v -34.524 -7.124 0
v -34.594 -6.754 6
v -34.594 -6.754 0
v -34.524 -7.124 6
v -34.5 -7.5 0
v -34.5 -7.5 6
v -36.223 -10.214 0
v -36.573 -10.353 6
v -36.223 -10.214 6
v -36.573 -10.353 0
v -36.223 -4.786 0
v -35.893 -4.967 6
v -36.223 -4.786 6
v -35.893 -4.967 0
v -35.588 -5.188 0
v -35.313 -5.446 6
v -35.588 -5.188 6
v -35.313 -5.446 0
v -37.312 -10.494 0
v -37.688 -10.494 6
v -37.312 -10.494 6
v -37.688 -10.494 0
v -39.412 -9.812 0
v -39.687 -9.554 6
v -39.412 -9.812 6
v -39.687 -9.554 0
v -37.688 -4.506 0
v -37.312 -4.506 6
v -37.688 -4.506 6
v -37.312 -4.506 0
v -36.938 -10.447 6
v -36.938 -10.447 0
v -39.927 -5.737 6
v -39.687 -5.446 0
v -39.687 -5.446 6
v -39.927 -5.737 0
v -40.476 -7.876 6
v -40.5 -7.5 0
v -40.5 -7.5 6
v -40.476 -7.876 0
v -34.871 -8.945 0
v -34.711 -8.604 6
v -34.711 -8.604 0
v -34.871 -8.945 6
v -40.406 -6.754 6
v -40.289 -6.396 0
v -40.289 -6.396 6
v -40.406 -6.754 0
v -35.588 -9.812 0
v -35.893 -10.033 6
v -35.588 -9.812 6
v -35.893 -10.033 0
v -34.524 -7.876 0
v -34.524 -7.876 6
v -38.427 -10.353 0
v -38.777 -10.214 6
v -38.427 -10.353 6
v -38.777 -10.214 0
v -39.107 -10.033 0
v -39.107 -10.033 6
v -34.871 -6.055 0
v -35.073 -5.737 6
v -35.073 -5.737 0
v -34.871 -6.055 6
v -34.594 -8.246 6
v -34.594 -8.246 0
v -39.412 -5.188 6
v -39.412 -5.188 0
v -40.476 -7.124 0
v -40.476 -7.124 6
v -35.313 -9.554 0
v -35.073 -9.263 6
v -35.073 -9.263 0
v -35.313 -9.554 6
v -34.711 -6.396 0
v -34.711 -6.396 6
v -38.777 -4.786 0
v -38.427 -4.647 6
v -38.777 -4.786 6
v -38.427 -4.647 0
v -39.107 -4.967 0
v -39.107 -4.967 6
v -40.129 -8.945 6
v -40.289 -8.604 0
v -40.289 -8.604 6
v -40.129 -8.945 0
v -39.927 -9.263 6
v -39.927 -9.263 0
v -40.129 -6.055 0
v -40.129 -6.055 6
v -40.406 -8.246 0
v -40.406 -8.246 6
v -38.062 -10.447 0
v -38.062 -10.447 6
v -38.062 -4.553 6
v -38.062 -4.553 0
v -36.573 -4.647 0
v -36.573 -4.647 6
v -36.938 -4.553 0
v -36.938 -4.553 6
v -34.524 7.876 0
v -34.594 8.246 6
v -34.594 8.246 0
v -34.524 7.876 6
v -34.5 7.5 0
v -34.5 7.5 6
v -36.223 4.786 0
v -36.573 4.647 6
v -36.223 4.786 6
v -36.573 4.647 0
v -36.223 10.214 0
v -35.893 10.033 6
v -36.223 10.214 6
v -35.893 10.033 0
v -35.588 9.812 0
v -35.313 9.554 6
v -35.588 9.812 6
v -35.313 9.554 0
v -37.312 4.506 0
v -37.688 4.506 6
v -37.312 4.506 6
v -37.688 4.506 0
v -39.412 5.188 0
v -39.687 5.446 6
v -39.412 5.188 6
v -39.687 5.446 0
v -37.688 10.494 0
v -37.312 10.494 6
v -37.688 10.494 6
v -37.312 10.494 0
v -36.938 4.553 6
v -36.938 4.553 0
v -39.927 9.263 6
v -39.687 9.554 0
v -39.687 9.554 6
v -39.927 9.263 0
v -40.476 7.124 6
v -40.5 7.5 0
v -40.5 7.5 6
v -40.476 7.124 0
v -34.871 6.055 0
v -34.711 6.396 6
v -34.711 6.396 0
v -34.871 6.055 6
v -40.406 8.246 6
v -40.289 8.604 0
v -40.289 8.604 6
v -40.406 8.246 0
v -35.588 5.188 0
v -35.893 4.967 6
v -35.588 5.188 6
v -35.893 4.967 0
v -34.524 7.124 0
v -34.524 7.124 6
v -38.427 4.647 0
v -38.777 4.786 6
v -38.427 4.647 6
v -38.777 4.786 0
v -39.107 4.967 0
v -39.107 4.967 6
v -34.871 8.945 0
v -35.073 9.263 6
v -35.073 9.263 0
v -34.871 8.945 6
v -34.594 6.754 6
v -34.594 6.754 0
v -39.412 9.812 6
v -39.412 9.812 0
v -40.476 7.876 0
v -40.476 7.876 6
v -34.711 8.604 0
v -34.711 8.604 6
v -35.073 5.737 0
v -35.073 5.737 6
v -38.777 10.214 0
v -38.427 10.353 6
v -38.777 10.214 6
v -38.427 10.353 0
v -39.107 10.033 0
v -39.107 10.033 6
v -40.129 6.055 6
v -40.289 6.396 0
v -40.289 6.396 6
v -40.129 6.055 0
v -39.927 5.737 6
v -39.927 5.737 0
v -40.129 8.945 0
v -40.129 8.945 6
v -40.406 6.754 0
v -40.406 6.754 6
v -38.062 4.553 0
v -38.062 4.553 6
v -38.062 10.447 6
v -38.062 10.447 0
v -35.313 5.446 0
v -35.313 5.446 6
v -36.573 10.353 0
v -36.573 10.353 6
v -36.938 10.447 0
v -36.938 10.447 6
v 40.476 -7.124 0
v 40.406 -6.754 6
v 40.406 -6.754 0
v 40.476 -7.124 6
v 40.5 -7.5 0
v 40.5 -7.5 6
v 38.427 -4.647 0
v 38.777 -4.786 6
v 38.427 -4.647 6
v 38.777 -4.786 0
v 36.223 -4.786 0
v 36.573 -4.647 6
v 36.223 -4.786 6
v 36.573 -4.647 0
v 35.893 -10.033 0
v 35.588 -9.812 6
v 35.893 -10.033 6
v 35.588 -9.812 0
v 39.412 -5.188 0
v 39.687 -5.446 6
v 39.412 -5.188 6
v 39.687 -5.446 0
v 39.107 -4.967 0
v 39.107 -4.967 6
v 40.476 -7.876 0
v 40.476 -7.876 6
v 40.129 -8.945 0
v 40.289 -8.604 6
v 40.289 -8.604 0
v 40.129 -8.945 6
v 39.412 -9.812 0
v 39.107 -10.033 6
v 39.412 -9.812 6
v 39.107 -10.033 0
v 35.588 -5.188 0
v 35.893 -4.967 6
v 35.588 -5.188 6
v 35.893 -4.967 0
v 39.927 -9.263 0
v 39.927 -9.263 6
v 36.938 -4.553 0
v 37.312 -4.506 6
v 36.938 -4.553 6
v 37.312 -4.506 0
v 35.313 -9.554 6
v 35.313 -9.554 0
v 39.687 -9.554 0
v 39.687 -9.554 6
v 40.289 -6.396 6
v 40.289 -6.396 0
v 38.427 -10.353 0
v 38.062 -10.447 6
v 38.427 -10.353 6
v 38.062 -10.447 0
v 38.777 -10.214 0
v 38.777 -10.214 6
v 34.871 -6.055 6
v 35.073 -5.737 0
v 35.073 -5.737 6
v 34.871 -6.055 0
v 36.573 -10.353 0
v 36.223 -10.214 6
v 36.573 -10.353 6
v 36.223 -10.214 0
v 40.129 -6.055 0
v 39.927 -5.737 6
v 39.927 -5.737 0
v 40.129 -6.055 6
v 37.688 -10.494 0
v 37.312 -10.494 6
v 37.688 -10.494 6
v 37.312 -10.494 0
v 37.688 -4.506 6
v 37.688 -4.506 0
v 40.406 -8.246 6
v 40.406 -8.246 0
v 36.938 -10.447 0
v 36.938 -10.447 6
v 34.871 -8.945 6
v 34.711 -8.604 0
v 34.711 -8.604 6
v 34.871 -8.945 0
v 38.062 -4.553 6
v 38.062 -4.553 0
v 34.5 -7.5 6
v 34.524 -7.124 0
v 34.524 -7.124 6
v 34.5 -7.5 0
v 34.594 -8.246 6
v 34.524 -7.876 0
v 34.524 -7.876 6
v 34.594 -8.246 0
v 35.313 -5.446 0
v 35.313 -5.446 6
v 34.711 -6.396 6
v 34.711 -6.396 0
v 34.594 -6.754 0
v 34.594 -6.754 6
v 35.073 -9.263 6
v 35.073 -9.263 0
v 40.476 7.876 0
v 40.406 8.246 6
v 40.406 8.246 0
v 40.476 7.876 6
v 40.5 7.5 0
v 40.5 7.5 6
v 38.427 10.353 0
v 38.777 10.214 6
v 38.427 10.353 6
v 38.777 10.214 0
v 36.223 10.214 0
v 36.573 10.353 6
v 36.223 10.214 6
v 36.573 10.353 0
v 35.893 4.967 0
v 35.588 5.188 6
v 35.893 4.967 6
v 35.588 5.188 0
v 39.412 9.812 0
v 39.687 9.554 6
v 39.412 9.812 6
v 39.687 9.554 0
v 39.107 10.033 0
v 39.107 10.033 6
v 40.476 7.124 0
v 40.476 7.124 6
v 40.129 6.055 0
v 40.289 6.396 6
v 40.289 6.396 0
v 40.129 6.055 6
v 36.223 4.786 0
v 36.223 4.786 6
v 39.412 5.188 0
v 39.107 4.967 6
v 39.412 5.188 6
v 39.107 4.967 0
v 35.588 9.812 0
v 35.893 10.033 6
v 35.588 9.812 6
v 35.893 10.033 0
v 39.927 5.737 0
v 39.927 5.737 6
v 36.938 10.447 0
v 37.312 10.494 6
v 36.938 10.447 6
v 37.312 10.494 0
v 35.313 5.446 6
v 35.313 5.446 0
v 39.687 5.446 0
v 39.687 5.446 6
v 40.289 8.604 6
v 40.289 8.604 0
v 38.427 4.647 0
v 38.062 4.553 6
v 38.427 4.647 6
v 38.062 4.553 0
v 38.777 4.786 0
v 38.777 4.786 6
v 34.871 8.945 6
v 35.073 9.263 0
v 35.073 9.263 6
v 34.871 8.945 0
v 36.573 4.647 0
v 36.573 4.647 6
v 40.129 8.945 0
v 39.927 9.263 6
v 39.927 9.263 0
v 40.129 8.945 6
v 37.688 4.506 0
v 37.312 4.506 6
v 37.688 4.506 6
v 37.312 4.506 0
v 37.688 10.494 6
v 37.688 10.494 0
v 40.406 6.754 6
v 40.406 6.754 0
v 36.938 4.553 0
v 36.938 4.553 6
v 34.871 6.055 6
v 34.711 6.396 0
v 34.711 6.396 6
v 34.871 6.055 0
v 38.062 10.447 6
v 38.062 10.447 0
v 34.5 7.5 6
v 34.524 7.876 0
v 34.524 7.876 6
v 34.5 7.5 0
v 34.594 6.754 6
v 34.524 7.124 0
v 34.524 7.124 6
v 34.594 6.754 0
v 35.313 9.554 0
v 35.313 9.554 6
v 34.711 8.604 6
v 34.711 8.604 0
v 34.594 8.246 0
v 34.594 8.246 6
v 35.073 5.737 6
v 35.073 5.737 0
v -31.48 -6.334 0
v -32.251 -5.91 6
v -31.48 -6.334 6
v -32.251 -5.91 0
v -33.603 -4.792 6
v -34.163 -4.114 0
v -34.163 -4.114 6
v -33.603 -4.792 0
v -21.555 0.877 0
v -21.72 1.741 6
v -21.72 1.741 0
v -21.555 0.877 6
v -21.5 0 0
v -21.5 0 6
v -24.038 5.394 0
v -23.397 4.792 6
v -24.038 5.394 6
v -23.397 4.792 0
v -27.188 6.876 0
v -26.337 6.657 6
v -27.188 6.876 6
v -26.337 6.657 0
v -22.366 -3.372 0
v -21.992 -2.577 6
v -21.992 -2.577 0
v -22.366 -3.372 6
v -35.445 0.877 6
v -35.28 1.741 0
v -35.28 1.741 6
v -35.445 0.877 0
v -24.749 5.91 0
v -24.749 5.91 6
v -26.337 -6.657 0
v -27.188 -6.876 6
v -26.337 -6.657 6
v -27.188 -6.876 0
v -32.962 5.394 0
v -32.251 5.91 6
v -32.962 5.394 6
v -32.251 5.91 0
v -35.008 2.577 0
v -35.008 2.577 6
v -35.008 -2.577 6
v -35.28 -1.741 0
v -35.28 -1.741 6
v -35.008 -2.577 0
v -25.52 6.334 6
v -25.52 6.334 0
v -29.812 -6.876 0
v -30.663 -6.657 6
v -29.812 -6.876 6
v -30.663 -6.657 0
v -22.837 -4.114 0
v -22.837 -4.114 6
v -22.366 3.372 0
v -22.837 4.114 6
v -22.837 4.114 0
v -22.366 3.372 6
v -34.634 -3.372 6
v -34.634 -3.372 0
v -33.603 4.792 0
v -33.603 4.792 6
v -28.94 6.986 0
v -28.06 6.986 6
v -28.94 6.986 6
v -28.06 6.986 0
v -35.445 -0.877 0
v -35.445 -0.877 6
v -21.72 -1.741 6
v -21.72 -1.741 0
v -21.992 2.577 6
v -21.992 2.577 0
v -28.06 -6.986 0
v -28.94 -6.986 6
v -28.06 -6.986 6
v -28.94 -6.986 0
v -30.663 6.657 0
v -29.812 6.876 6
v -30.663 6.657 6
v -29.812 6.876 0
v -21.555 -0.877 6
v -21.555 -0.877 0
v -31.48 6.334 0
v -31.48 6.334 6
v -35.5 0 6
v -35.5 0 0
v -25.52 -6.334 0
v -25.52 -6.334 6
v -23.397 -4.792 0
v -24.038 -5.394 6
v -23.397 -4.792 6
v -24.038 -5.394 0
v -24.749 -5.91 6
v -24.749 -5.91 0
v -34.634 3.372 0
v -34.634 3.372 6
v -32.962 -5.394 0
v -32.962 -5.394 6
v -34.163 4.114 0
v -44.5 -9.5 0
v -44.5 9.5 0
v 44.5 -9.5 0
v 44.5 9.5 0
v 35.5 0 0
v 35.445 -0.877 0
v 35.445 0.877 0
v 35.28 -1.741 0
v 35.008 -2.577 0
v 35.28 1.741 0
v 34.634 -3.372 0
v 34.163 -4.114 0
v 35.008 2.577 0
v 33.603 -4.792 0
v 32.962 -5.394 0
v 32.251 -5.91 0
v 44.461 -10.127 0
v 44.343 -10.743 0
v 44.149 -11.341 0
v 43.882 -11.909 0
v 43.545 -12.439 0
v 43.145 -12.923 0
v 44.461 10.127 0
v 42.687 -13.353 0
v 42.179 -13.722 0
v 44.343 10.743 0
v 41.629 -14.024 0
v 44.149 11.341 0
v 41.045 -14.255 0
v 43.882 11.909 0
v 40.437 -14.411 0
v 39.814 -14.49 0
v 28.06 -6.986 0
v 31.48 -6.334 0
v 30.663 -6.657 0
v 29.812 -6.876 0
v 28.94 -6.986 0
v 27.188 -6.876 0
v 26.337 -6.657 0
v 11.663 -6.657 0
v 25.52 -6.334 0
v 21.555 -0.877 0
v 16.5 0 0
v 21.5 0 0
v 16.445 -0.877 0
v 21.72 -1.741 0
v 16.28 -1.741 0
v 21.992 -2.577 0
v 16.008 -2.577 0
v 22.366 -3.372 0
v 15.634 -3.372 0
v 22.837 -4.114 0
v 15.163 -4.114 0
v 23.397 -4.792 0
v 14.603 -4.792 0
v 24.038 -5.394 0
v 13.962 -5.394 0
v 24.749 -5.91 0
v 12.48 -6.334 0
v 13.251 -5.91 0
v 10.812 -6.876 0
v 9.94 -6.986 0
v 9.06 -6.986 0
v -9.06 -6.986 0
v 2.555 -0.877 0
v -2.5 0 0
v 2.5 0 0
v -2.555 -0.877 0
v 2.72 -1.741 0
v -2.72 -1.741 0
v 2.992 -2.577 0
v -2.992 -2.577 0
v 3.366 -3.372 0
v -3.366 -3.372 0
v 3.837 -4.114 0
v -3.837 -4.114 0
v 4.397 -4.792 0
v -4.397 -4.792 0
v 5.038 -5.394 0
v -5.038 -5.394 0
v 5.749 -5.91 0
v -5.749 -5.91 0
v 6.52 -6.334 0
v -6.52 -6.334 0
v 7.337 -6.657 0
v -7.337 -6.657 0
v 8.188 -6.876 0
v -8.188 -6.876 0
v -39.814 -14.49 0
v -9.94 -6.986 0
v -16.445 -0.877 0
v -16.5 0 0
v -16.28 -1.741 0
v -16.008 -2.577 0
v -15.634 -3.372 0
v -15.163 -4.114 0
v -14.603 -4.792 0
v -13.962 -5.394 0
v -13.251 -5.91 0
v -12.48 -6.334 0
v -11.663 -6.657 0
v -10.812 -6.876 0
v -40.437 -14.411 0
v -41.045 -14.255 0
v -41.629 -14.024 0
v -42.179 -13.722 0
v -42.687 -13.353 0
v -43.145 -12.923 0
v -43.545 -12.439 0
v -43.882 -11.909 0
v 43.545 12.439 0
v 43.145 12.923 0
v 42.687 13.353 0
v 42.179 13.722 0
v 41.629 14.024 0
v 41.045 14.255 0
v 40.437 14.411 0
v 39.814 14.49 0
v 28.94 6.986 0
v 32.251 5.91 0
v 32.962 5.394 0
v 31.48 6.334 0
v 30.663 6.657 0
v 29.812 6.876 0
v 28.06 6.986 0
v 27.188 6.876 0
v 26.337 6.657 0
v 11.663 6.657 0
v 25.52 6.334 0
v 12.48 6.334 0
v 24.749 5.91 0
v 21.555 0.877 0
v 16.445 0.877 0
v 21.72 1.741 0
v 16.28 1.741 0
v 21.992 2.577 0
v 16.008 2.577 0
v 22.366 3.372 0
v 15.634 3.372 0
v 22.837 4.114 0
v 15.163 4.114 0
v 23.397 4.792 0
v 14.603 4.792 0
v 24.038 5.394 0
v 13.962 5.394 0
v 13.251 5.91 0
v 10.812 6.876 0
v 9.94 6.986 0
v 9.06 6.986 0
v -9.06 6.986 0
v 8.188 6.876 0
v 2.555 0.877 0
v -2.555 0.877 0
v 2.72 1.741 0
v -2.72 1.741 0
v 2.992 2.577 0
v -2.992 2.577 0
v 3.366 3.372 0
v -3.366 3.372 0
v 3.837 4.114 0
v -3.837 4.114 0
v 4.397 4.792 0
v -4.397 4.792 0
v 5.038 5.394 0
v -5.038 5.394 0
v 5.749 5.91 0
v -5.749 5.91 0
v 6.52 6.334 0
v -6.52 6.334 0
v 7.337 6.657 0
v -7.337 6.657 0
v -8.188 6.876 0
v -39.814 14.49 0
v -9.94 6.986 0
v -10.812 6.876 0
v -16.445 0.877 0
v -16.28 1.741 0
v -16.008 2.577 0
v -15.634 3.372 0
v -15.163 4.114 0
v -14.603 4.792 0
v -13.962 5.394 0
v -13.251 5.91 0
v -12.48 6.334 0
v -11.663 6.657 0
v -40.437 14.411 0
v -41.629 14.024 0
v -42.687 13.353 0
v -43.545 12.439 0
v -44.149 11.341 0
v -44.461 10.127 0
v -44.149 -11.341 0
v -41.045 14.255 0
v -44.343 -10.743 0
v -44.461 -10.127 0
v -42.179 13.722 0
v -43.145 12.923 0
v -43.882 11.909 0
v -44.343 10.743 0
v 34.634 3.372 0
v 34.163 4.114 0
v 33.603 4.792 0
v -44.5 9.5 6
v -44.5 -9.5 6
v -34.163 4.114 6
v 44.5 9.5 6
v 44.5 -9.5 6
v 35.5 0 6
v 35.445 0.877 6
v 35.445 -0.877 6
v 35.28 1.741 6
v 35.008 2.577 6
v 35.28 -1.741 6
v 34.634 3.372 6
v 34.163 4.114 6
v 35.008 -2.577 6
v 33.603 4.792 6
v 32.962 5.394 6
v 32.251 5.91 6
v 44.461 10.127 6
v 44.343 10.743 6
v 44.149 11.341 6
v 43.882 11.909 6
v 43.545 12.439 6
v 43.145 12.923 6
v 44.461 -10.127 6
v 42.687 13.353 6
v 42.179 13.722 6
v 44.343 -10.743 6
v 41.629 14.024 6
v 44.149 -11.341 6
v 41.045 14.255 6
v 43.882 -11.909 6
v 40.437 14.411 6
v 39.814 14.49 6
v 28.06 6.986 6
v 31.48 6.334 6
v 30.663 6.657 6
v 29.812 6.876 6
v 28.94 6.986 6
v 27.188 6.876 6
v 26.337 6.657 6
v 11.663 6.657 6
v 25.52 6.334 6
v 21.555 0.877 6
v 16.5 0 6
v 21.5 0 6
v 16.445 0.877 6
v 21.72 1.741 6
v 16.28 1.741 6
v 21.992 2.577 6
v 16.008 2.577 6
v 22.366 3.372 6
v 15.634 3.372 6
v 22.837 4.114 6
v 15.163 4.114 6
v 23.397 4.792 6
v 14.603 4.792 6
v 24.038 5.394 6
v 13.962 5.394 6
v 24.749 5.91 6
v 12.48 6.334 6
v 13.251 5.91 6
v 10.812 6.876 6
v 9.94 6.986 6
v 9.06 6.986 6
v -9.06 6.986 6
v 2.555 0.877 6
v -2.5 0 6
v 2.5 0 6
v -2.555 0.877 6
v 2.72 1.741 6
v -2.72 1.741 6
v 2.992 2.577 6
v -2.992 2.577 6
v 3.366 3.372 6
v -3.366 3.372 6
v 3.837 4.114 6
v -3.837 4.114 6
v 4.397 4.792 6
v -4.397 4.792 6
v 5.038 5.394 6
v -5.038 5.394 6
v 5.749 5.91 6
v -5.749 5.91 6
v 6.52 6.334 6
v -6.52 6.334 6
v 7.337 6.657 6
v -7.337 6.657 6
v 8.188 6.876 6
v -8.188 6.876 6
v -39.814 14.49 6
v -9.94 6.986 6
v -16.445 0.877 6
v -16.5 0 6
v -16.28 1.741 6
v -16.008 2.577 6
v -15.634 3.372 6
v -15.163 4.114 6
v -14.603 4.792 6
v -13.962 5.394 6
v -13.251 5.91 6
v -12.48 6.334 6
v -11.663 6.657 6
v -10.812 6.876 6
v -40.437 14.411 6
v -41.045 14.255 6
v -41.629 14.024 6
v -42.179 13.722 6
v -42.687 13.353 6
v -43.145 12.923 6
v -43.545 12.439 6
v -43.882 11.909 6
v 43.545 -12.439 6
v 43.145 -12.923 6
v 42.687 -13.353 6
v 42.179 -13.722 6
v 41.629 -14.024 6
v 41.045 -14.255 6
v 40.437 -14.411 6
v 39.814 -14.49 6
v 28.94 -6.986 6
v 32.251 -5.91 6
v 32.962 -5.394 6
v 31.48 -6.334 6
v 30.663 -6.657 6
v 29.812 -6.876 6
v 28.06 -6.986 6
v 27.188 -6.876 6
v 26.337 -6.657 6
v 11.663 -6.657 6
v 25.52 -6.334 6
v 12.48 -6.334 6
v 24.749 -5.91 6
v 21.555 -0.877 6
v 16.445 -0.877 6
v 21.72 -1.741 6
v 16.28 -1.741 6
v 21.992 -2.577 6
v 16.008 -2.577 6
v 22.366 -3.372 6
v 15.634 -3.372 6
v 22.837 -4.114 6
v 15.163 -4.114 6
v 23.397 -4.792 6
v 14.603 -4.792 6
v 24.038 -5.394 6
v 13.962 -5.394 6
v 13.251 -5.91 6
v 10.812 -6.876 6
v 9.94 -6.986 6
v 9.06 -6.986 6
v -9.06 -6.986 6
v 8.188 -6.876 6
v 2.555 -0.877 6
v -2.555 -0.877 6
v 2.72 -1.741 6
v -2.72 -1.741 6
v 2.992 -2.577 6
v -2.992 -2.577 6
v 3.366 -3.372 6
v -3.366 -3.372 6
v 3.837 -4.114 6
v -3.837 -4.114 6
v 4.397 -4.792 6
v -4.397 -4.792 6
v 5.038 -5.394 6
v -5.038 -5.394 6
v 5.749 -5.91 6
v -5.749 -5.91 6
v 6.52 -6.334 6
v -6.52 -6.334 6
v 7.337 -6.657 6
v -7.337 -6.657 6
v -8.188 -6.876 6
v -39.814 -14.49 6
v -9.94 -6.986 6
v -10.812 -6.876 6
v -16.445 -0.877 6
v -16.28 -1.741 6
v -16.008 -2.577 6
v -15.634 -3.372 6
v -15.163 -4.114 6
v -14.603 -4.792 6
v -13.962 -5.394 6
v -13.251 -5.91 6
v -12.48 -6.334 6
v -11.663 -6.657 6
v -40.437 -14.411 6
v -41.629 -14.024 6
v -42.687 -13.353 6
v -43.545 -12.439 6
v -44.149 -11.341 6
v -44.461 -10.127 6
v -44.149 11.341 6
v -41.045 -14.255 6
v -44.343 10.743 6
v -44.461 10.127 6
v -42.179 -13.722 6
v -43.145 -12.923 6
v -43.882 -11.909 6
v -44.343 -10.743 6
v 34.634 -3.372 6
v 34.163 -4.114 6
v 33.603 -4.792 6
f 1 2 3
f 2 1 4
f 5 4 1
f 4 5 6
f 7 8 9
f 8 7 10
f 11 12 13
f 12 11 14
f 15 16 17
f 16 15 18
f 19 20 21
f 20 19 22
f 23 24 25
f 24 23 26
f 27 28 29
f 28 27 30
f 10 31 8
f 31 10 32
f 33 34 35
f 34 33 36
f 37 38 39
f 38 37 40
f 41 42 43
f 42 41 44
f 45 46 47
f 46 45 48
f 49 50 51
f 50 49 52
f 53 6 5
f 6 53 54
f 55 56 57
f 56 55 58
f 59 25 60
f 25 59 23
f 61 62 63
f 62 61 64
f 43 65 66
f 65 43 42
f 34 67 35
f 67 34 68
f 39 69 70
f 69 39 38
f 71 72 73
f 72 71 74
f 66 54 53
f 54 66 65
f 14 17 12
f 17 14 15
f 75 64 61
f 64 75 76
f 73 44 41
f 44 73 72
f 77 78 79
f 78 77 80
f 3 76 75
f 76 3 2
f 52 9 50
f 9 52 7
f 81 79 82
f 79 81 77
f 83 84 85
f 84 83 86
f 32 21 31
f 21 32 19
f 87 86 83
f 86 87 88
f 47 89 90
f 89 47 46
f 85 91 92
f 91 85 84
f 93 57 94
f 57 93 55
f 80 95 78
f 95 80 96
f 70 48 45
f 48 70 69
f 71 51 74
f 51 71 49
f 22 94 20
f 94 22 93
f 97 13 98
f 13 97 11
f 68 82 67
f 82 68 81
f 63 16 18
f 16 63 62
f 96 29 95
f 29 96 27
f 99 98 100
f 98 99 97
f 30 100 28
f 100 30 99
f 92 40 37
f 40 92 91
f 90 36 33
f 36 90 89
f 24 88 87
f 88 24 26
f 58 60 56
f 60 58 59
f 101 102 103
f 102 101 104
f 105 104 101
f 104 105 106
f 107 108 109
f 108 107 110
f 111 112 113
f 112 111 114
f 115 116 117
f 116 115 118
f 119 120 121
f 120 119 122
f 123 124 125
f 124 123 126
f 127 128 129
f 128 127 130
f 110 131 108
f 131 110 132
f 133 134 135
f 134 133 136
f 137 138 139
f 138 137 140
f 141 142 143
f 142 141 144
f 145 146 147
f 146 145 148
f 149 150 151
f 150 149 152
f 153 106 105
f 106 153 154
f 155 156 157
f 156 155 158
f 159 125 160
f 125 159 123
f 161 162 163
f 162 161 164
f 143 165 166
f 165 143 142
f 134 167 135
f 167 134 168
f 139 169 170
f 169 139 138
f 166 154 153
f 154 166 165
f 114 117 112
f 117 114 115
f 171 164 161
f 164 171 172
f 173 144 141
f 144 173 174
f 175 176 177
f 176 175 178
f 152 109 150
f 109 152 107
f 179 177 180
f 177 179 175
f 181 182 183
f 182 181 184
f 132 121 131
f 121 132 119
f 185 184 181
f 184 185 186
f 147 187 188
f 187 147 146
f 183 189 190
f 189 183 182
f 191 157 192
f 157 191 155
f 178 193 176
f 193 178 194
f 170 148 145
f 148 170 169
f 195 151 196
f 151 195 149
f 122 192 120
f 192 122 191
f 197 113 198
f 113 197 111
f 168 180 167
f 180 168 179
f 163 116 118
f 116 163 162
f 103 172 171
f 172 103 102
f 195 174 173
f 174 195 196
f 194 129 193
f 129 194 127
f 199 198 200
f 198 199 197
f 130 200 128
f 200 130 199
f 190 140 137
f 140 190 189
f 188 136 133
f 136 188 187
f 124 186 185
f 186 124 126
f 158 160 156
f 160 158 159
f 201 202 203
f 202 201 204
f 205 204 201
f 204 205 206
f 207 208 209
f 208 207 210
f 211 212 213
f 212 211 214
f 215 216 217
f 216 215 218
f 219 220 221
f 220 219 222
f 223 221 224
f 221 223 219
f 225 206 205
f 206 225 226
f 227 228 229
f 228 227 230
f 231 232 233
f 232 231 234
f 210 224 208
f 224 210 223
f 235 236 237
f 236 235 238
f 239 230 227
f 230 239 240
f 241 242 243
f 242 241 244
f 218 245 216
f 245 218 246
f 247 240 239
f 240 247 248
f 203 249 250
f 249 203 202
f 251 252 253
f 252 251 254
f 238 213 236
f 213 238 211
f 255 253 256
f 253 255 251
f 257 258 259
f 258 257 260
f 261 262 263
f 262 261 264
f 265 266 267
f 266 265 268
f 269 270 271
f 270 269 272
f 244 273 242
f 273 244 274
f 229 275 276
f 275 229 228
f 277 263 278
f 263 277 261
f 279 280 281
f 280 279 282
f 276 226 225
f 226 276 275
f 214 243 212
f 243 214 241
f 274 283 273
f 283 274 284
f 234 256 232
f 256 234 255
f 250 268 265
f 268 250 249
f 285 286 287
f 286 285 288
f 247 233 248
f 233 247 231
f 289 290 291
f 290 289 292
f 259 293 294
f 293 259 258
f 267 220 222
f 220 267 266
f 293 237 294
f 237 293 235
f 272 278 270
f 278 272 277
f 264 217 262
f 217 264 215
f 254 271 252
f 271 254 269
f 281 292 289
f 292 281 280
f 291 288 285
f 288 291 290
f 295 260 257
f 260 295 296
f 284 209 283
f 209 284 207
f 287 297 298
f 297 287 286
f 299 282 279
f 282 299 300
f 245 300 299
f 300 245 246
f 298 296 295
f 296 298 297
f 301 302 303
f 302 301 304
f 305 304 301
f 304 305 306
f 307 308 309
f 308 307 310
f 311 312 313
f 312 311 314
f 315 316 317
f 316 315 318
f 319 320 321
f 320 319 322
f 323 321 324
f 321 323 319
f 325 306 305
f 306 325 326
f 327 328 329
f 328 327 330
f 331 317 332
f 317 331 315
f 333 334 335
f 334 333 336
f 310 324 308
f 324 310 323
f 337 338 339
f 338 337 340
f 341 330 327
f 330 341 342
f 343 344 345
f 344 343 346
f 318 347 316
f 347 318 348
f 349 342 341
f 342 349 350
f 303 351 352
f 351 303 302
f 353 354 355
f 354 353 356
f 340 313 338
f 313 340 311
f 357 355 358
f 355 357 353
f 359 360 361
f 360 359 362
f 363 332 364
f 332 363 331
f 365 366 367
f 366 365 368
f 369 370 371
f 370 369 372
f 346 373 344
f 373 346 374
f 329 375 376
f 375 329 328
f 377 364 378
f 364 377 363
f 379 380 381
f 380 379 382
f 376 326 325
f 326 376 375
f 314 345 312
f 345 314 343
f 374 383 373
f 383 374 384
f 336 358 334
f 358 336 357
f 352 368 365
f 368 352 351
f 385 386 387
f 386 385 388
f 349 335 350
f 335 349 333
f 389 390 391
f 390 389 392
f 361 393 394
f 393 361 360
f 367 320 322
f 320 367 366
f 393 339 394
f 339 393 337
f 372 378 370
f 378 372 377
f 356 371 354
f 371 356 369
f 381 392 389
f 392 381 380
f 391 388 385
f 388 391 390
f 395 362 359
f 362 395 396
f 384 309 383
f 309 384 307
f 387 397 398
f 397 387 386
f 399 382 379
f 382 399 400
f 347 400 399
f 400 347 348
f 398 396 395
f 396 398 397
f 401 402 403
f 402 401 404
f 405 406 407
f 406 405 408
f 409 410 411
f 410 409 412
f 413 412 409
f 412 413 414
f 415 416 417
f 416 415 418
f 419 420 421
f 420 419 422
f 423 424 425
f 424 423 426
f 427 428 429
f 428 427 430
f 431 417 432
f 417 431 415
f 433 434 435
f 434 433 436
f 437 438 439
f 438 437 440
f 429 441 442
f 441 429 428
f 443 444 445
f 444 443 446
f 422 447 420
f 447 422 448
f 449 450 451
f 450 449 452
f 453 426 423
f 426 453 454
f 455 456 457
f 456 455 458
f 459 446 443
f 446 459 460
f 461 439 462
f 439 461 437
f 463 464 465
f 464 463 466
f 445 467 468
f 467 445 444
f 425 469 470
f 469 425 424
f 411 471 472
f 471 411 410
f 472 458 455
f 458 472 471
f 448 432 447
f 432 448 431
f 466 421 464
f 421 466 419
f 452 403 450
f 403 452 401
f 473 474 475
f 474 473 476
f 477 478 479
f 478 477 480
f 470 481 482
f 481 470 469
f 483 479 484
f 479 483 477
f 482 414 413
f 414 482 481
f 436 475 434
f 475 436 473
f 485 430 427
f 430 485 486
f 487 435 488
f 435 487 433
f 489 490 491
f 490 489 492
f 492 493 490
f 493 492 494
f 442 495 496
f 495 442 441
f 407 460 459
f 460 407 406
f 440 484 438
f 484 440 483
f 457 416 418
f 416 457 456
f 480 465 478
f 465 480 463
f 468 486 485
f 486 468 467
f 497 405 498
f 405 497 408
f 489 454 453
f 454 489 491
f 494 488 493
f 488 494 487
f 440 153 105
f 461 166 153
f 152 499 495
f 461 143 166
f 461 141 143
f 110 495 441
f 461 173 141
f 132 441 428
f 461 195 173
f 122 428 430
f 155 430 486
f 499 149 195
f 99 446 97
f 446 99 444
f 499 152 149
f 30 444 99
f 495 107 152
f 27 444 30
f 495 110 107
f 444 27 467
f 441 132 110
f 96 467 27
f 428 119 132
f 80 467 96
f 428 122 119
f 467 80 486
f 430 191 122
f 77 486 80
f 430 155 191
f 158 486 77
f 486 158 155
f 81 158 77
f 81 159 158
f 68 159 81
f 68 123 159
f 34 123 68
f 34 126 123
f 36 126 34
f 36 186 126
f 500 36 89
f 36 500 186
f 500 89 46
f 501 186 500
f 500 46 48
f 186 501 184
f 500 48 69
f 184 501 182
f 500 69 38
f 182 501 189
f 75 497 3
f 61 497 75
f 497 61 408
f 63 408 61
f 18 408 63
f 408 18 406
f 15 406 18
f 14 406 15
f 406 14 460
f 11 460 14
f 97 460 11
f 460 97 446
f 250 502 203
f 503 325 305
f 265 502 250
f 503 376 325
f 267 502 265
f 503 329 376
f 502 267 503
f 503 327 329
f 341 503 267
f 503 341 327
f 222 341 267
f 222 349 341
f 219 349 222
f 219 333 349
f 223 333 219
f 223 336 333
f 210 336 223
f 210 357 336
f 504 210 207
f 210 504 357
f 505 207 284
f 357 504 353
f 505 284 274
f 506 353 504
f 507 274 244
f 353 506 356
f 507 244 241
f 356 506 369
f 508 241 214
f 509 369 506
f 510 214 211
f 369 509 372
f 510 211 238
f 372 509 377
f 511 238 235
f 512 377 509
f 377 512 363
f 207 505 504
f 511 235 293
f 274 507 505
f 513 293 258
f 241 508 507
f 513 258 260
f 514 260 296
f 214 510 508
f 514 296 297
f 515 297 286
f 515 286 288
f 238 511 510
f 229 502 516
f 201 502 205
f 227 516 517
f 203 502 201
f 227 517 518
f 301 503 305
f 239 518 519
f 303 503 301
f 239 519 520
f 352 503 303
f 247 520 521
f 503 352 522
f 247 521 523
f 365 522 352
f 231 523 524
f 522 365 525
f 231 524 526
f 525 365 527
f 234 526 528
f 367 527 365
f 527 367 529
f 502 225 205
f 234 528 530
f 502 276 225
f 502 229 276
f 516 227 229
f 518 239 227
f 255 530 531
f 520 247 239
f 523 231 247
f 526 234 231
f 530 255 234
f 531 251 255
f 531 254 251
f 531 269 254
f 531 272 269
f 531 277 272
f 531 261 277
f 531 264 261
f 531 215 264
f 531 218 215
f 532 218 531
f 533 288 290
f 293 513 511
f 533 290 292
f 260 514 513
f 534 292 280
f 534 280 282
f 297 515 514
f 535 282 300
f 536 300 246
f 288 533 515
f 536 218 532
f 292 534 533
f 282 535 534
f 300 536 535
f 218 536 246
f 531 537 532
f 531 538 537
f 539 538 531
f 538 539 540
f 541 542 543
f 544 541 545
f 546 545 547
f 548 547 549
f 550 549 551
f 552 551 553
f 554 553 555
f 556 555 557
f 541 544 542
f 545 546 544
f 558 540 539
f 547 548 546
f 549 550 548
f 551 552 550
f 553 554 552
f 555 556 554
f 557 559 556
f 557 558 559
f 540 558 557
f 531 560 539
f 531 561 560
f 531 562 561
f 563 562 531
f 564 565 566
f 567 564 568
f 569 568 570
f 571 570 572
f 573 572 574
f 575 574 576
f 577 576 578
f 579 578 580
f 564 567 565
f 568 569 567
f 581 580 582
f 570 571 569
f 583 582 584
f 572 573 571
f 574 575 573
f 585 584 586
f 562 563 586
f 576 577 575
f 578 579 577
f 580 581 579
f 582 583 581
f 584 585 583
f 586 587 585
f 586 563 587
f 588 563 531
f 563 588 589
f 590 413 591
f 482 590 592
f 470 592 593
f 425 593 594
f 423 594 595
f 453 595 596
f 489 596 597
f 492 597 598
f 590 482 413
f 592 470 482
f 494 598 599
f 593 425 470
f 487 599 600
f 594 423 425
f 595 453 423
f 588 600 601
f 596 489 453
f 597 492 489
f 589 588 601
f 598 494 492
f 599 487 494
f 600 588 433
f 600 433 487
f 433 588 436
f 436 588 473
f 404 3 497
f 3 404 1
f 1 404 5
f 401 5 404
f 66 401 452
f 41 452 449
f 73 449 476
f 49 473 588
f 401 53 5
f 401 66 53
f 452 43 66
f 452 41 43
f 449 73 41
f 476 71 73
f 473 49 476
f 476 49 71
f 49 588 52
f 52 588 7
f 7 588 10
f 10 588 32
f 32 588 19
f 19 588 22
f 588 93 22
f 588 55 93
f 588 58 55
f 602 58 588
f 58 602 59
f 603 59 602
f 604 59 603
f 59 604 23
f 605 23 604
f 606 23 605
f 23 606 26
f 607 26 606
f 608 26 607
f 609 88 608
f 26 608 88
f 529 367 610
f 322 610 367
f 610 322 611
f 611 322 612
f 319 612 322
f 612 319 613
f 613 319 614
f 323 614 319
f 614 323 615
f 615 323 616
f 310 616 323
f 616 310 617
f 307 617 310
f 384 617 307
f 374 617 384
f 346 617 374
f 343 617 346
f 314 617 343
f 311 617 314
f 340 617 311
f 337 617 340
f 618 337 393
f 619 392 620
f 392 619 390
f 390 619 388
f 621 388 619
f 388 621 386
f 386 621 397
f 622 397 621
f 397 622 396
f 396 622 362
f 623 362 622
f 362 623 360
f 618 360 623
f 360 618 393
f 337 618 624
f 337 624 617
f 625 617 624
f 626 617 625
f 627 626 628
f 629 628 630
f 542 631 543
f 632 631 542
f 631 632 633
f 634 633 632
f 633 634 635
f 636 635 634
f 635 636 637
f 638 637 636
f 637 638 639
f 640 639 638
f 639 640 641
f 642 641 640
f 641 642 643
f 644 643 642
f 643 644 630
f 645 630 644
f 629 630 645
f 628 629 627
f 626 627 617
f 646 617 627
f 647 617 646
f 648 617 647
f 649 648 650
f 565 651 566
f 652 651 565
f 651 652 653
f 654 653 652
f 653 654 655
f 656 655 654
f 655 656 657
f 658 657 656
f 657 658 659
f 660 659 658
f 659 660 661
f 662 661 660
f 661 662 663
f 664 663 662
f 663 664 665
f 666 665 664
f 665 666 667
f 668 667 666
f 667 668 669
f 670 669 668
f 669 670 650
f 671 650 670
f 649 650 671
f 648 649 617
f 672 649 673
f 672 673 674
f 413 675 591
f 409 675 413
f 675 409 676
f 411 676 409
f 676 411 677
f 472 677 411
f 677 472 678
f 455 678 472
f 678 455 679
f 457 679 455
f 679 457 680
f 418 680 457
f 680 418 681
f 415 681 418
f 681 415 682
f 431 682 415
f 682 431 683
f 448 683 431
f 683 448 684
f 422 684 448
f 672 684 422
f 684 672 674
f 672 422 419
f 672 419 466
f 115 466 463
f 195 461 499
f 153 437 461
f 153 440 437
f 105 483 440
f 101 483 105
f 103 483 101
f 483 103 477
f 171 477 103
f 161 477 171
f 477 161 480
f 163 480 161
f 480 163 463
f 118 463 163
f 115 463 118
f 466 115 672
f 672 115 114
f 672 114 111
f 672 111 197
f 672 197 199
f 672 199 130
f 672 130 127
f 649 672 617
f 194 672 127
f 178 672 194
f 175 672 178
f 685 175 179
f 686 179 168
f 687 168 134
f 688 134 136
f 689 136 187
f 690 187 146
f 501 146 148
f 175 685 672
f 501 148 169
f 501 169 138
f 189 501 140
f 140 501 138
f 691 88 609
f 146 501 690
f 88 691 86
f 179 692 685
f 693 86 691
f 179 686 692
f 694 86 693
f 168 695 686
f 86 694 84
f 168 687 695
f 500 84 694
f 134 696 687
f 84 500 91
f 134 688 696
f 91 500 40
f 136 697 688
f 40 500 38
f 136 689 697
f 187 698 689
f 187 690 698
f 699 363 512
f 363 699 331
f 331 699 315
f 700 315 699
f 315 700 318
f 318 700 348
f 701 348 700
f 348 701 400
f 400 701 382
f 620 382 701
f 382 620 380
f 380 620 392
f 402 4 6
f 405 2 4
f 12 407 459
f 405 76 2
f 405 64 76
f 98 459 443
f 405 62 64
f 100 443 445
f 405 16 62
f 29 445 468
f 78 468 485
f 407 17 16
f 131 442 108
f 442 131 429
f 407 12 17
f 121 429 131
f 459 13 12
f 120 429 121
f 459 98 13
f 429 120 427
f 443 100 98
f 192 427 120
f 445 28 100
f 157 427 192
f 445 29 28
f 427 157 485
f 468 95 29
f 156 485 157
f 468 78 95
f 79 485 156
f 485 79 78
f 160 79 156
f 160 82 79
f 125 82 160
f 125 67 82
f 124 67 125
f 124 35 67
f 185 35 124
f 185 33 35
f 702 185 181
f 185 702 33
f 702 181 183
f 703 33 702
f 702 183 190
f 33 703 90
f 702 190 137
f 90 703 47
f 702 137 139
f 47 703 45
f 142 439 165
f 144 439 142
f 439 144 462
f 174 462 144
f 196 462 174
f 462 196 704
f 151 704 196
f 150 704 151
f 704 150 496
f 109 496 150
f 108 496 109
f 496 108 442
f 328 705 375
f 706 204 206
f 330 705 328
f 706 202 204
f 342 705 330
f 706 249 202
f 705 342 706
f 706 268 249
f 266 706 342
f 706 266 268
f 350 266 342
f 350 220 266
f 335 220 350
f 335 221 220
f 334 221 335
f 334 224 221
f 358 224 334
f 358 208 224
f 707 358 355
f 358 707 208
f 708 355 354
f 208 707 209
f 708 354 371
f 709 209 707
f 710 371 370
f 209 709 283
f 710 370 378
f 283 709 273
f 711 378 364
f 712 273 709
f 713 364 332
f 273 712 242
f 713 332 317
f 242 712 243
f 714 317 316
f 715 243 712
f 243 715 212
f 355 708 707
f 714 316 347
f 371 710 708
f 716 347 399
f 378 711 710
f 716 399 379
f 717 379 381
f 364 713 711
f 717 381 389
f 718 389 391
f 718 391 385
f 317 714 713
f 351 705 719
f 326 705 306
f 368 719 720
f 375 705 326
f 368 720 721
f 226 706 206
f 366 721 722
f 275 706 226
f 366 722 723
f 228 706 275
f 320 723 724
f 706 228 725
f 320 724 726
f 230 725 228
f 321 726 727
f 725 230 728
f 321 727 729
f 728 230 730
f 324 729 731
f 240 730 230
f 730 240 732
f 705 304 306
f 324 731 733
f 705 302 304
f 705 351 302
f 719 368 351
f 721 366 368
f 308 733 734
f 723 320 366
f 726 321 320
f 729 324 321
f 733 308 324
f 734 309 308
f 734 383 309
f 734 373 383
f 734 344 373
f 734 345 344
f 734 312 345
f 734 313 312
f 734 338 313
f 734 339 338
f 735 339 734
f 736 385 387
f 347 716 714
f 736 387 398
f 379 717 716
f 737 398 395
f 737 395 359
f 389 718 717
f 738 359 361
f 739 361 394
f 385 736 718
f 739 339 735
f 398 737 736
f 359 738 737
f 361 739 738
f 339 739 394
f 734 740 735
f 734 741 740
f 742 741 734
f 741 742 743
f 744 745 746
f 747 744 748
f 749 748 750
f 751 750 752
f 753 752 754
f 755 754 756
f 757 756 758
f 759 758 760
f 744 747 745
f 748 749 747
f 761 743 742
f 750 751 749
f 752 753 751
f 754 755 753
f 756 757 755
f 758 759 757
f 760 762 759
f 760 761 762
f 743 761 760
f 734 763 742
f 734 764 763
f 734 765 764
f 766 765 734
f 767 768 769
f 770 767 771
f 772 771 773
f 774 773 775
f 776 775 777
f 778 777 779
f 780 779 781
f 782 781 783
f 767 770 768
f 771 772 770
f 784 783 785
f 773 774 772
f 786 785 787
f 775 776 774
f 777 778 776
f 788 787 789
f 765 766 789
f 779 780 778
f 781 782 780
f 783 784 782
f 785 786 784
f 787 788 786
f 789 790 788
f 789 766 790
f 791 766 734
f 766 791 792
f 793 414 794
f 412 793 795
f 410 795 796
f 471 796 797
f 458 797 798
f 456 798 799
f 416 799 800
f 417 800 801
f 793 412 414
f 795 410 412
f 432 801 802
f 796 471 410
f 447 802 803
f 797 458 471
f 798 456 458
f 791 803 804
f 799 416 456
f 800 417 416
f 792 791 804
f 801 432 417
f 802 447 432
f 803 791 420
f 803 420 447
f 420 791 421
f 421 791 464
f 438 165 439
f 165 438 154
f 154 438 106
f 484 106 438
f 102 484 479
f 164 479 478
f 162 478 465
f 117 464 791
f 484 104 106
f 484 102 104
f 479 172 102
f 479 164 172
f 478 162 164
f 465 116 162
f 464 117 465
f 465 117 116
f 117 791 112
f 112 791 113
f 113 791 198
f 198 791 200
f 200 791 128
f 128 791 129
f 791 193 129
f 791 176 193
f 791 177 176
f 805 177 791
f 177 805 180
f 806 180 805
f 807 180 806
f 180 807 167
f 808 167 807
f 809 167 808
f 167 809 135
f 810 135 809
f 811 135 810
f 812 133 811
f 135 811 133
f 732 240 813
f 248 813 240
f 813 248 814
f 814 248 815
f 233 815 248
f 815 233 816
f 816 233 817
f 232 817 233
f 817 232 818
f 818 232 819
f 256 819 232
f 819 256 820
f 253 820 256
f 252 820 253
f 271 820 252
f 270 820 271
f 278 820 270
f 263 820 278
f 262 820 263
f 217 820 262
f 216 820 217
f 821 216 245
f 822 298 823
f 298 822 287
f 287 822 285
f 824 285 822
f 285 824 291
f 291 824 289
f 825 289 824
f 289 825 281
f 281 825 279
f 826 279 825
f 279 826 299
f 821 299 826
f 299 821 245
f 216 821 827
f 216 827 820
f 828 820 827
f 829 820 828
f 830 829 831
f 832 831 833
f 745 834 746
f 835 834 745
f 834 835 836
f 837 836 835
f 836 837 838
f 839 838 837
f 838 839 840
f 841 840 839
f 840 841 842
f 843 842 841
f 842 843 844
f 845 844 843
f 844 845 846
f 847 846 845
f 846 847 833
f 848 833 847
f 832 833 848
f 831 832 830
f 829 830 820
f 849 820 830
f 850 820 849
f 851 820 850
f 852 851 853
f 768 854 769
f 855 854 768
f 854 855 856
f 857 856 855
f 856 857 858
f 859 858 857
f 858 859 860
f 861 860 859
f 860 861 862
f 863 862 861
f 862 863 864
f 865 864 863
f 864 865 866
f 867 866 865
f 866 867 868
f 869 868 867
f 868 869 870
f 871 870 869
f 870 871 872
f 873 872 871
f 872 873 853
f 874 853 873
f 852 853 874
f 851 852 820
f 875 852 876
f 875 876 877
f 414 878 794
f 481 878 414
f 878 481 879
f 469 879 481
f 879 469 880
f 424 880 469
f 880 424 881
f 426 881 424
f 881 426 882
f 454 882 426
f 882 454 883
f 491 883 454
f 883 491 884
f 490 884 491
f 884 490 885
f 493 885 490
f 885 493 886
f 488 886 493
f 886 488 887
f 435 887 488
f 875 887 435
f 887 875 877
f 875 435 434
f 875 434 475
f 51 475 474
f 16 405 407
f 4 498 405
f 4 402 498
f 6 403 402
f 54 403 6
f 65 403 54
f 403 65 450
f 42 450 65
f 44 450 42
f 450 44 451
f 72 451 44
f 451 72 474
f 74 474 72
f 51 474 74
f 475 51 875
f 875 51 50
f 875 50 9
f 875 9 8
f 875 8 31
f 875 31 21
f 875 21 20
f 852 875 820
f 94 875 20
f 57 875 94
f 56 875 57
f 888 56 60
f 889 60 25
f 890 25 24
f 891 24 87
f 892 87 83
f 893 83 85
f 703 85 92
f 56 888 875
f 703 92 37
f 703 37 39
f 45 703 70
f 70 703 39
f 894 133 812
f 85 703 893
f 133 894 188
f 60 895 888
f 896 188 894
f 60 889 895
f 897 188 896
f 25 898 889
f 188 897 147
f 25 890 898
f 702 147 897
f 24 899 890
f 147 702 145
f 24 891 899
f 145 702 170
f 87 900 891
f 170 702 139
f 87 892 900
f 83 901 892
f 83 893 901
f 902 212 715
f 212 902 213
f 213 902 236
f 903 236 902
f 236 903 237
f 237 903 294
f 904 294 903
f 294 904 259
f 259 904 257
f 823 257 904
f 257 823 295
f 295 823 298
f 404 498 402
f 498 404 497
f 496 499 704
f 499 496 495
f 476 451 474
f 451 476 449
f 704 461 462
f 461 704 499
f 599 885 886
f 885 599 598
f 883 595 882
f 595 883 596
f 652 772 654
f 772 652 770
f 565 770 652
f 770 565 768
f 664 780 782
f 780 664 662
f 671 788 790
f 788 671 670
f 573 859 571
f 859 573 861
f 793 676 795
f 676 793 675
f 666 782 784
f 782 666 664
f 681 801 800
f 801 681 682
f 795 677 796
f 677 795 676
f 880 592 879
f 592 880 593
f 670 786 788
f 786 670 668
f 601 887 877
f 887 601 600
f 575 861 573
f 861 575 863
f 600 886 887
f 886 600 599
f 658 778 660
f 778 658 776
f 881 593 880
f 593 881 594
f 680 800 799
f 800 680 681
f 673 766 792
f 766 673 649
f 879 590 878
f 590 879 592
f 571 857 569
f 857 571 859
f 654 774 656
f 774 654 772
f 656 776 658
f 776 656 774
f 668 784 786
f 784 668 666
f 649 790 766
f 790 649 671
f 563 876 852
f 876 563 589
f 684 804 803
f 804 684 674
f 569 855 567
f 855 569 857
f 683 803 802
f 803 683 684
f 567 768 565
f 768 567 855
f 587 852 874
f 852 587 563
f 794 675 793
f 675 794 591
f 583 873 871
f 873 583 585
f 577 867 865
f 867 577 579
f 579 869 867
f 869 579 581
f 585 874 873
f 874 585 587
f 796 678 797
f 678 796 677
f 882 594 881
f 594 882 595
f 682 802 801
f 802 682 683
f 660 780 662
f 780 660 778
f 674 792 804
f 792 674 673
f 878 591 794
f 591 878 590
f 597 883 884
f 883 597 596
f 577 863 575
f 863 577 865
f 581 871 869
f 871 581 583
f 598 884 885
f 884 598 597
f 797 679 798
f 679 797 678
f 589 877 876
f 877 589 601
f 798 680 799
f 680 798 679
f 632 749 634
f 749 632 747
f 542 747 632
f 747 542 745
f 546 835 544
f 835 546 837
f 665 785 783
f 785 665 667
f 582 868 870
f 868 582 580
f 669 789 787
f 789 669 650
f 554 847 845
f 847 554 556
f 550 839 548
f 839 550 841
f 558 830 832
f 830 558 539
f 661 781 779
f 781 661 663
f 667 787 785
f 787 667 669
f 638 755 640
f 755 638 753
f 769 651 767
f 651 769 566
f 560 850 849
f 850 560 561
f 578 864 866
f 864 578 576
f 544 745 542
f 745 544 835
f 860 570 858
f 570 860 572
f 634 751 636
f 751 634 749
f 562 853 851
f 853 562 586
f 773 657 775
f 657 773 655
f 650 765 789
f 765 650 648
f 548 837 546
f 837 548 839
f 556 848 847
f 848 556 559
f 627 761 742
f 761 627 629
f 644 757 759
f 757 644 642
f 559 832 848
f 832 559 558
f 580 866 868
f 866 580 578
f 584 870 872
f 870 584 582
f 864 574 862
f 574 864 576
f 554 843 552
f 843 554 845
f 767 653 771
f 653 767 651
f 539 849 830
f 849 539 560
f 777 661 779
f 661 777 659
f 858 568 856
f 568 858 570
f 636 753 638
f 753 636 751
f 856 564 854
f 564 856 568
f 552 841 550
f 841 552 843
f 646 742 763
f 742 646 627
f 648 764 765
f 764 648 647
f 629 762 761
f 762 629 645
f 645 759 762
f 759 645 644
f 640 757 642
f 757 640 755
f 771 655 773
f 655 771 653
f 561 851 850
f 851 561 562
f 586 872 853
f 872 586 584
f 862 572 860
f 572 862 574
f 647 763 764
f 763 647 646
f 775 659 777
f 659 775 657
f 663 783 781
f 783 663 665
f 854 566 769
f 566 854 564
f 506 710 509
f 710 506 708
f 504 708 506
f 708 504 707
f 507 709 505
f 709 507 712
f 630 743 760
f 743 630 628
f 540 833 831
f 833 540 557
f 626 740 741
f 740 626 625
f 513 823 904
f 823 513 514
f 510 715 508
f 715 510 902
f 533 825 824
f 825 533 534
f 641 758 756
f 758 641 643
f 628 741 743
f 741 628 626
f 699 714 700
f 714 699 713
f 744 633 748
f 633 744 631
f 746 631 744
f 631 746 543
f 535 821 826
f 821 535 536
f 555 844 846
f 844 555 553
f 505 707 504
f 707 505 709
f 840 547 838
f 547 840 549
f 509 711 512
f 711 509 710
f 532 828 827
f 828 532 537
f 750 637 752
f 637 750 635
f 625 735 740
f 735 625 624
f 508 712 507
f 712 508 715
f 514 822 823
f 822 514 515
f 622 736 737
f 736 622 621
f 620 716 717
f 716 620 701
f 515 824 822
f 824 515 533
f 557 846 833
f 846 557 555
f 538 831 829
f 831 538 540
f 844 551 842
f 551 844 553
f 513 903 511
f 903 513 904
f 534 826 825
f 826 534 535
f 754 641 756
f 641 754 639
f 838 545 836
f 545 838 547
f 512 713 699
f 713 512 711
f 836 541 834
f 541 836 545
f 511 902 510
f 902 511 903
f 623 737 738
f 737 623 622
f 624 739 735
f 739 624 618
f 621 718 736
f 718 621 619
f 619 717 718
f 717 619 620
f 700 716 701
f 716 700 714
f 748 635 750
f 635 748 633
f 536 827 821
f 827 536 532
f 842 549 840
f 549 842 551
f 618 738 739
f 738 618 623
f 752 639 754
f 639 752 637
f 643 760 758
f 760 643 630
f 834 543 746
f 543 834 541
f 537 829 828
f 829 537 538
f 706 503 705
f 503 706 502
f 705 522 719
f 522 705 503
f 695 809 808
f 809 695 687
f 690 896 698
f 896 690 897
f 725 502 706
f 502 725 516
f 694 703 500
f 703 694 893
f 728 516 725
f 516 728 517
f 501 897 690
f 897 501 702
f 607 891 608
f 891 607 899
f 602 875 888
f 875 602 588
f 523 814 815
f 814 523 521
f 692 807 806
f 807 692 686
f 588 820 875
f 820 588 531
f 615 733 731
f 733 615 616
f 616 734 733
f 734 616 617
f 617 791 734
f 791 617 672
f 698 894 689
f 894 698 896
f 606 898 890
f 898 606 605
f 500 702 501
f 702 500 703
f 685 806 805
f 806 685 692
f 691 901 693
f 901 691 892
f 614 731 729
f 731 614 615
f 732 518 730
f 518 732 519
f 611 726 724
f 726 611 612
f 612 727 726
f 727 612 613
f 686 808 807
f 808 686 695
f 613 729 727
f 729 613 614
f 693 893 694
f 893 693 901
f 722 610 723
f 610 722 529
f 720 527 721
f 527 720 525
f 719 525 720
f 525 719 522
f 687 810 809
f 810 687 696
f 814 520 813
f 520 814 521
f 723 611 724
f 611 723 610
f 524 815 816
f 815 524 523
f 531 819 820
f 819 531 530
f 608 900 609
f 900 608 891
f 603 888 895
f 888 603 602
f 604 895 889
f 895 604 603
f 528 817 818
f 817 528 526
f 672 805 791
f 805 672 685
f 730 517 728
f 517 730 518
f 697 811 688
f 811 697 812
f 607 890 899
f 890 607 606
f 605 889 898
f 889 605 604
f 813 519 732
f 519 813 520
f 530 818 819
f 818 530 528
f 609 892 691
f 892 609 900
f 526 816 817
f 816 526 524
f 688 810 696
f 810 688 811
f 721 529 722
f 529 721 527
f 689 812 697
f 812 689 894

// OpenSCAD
$fn = 50;


difference() {
	union() {
		hull() {
			translate(v = [-39.5000000000, 9.5000000000, 0]) {
				cylinder(h = 6, r = 5);
			}
			translate(v = [39.5000000000, 9.5000000000, 0]) {
				cylinder(h = 6, r = 5);
			}
			translate(v = [-39.5000000000, -9.5000000000, 0]) {
				cylinder(h = 6, r = 5);
			}
			translate(v = [39.5000000000, -9.5000000000, 0]) {
				cylinder(h = 6, r = 5);
			}
		}
	}
	union() {
		#translate(v = [-37.5000000000, -7.5000000000, -100.0000000000]) {
			cylinder(h = 200, r = 3.0000000000);
		}
		#translate(v = [-37.5000000000, 7.5000000000, -100.0000000000]) {
			cylinder(h = 200, r = 3.0000000000);
		}
		#translate(v = [37.5000000000, -7.5000000000, -100.0000000000]) {
			cylinder(h = 200, r = 3.0000000000);
		}
		#translate(v = [37.5000000000, 7.5000000000, -100.0000000000]) {
			cylinder(h = 200, r = 3.0000000000);
		}
		#translate(v = [-28.5000000000, 0, 0]) {
			cylinder(h = 6, r = 7.0000000000);
		}
		#translate(v = [-9.5000000000, 0, 0]) {
			cylinder(h = 6, r = 7.0000000000);
		}
		#translate(v = [9.5000000000, 0, 0]) {
			cylinder(h = 6, r = 7.0000000000);
		}
		#translate(v = [28.5000000000, 0, 0]) {
			cylinder(h = 6, r = 7.0000000000);
		}
	}
}
